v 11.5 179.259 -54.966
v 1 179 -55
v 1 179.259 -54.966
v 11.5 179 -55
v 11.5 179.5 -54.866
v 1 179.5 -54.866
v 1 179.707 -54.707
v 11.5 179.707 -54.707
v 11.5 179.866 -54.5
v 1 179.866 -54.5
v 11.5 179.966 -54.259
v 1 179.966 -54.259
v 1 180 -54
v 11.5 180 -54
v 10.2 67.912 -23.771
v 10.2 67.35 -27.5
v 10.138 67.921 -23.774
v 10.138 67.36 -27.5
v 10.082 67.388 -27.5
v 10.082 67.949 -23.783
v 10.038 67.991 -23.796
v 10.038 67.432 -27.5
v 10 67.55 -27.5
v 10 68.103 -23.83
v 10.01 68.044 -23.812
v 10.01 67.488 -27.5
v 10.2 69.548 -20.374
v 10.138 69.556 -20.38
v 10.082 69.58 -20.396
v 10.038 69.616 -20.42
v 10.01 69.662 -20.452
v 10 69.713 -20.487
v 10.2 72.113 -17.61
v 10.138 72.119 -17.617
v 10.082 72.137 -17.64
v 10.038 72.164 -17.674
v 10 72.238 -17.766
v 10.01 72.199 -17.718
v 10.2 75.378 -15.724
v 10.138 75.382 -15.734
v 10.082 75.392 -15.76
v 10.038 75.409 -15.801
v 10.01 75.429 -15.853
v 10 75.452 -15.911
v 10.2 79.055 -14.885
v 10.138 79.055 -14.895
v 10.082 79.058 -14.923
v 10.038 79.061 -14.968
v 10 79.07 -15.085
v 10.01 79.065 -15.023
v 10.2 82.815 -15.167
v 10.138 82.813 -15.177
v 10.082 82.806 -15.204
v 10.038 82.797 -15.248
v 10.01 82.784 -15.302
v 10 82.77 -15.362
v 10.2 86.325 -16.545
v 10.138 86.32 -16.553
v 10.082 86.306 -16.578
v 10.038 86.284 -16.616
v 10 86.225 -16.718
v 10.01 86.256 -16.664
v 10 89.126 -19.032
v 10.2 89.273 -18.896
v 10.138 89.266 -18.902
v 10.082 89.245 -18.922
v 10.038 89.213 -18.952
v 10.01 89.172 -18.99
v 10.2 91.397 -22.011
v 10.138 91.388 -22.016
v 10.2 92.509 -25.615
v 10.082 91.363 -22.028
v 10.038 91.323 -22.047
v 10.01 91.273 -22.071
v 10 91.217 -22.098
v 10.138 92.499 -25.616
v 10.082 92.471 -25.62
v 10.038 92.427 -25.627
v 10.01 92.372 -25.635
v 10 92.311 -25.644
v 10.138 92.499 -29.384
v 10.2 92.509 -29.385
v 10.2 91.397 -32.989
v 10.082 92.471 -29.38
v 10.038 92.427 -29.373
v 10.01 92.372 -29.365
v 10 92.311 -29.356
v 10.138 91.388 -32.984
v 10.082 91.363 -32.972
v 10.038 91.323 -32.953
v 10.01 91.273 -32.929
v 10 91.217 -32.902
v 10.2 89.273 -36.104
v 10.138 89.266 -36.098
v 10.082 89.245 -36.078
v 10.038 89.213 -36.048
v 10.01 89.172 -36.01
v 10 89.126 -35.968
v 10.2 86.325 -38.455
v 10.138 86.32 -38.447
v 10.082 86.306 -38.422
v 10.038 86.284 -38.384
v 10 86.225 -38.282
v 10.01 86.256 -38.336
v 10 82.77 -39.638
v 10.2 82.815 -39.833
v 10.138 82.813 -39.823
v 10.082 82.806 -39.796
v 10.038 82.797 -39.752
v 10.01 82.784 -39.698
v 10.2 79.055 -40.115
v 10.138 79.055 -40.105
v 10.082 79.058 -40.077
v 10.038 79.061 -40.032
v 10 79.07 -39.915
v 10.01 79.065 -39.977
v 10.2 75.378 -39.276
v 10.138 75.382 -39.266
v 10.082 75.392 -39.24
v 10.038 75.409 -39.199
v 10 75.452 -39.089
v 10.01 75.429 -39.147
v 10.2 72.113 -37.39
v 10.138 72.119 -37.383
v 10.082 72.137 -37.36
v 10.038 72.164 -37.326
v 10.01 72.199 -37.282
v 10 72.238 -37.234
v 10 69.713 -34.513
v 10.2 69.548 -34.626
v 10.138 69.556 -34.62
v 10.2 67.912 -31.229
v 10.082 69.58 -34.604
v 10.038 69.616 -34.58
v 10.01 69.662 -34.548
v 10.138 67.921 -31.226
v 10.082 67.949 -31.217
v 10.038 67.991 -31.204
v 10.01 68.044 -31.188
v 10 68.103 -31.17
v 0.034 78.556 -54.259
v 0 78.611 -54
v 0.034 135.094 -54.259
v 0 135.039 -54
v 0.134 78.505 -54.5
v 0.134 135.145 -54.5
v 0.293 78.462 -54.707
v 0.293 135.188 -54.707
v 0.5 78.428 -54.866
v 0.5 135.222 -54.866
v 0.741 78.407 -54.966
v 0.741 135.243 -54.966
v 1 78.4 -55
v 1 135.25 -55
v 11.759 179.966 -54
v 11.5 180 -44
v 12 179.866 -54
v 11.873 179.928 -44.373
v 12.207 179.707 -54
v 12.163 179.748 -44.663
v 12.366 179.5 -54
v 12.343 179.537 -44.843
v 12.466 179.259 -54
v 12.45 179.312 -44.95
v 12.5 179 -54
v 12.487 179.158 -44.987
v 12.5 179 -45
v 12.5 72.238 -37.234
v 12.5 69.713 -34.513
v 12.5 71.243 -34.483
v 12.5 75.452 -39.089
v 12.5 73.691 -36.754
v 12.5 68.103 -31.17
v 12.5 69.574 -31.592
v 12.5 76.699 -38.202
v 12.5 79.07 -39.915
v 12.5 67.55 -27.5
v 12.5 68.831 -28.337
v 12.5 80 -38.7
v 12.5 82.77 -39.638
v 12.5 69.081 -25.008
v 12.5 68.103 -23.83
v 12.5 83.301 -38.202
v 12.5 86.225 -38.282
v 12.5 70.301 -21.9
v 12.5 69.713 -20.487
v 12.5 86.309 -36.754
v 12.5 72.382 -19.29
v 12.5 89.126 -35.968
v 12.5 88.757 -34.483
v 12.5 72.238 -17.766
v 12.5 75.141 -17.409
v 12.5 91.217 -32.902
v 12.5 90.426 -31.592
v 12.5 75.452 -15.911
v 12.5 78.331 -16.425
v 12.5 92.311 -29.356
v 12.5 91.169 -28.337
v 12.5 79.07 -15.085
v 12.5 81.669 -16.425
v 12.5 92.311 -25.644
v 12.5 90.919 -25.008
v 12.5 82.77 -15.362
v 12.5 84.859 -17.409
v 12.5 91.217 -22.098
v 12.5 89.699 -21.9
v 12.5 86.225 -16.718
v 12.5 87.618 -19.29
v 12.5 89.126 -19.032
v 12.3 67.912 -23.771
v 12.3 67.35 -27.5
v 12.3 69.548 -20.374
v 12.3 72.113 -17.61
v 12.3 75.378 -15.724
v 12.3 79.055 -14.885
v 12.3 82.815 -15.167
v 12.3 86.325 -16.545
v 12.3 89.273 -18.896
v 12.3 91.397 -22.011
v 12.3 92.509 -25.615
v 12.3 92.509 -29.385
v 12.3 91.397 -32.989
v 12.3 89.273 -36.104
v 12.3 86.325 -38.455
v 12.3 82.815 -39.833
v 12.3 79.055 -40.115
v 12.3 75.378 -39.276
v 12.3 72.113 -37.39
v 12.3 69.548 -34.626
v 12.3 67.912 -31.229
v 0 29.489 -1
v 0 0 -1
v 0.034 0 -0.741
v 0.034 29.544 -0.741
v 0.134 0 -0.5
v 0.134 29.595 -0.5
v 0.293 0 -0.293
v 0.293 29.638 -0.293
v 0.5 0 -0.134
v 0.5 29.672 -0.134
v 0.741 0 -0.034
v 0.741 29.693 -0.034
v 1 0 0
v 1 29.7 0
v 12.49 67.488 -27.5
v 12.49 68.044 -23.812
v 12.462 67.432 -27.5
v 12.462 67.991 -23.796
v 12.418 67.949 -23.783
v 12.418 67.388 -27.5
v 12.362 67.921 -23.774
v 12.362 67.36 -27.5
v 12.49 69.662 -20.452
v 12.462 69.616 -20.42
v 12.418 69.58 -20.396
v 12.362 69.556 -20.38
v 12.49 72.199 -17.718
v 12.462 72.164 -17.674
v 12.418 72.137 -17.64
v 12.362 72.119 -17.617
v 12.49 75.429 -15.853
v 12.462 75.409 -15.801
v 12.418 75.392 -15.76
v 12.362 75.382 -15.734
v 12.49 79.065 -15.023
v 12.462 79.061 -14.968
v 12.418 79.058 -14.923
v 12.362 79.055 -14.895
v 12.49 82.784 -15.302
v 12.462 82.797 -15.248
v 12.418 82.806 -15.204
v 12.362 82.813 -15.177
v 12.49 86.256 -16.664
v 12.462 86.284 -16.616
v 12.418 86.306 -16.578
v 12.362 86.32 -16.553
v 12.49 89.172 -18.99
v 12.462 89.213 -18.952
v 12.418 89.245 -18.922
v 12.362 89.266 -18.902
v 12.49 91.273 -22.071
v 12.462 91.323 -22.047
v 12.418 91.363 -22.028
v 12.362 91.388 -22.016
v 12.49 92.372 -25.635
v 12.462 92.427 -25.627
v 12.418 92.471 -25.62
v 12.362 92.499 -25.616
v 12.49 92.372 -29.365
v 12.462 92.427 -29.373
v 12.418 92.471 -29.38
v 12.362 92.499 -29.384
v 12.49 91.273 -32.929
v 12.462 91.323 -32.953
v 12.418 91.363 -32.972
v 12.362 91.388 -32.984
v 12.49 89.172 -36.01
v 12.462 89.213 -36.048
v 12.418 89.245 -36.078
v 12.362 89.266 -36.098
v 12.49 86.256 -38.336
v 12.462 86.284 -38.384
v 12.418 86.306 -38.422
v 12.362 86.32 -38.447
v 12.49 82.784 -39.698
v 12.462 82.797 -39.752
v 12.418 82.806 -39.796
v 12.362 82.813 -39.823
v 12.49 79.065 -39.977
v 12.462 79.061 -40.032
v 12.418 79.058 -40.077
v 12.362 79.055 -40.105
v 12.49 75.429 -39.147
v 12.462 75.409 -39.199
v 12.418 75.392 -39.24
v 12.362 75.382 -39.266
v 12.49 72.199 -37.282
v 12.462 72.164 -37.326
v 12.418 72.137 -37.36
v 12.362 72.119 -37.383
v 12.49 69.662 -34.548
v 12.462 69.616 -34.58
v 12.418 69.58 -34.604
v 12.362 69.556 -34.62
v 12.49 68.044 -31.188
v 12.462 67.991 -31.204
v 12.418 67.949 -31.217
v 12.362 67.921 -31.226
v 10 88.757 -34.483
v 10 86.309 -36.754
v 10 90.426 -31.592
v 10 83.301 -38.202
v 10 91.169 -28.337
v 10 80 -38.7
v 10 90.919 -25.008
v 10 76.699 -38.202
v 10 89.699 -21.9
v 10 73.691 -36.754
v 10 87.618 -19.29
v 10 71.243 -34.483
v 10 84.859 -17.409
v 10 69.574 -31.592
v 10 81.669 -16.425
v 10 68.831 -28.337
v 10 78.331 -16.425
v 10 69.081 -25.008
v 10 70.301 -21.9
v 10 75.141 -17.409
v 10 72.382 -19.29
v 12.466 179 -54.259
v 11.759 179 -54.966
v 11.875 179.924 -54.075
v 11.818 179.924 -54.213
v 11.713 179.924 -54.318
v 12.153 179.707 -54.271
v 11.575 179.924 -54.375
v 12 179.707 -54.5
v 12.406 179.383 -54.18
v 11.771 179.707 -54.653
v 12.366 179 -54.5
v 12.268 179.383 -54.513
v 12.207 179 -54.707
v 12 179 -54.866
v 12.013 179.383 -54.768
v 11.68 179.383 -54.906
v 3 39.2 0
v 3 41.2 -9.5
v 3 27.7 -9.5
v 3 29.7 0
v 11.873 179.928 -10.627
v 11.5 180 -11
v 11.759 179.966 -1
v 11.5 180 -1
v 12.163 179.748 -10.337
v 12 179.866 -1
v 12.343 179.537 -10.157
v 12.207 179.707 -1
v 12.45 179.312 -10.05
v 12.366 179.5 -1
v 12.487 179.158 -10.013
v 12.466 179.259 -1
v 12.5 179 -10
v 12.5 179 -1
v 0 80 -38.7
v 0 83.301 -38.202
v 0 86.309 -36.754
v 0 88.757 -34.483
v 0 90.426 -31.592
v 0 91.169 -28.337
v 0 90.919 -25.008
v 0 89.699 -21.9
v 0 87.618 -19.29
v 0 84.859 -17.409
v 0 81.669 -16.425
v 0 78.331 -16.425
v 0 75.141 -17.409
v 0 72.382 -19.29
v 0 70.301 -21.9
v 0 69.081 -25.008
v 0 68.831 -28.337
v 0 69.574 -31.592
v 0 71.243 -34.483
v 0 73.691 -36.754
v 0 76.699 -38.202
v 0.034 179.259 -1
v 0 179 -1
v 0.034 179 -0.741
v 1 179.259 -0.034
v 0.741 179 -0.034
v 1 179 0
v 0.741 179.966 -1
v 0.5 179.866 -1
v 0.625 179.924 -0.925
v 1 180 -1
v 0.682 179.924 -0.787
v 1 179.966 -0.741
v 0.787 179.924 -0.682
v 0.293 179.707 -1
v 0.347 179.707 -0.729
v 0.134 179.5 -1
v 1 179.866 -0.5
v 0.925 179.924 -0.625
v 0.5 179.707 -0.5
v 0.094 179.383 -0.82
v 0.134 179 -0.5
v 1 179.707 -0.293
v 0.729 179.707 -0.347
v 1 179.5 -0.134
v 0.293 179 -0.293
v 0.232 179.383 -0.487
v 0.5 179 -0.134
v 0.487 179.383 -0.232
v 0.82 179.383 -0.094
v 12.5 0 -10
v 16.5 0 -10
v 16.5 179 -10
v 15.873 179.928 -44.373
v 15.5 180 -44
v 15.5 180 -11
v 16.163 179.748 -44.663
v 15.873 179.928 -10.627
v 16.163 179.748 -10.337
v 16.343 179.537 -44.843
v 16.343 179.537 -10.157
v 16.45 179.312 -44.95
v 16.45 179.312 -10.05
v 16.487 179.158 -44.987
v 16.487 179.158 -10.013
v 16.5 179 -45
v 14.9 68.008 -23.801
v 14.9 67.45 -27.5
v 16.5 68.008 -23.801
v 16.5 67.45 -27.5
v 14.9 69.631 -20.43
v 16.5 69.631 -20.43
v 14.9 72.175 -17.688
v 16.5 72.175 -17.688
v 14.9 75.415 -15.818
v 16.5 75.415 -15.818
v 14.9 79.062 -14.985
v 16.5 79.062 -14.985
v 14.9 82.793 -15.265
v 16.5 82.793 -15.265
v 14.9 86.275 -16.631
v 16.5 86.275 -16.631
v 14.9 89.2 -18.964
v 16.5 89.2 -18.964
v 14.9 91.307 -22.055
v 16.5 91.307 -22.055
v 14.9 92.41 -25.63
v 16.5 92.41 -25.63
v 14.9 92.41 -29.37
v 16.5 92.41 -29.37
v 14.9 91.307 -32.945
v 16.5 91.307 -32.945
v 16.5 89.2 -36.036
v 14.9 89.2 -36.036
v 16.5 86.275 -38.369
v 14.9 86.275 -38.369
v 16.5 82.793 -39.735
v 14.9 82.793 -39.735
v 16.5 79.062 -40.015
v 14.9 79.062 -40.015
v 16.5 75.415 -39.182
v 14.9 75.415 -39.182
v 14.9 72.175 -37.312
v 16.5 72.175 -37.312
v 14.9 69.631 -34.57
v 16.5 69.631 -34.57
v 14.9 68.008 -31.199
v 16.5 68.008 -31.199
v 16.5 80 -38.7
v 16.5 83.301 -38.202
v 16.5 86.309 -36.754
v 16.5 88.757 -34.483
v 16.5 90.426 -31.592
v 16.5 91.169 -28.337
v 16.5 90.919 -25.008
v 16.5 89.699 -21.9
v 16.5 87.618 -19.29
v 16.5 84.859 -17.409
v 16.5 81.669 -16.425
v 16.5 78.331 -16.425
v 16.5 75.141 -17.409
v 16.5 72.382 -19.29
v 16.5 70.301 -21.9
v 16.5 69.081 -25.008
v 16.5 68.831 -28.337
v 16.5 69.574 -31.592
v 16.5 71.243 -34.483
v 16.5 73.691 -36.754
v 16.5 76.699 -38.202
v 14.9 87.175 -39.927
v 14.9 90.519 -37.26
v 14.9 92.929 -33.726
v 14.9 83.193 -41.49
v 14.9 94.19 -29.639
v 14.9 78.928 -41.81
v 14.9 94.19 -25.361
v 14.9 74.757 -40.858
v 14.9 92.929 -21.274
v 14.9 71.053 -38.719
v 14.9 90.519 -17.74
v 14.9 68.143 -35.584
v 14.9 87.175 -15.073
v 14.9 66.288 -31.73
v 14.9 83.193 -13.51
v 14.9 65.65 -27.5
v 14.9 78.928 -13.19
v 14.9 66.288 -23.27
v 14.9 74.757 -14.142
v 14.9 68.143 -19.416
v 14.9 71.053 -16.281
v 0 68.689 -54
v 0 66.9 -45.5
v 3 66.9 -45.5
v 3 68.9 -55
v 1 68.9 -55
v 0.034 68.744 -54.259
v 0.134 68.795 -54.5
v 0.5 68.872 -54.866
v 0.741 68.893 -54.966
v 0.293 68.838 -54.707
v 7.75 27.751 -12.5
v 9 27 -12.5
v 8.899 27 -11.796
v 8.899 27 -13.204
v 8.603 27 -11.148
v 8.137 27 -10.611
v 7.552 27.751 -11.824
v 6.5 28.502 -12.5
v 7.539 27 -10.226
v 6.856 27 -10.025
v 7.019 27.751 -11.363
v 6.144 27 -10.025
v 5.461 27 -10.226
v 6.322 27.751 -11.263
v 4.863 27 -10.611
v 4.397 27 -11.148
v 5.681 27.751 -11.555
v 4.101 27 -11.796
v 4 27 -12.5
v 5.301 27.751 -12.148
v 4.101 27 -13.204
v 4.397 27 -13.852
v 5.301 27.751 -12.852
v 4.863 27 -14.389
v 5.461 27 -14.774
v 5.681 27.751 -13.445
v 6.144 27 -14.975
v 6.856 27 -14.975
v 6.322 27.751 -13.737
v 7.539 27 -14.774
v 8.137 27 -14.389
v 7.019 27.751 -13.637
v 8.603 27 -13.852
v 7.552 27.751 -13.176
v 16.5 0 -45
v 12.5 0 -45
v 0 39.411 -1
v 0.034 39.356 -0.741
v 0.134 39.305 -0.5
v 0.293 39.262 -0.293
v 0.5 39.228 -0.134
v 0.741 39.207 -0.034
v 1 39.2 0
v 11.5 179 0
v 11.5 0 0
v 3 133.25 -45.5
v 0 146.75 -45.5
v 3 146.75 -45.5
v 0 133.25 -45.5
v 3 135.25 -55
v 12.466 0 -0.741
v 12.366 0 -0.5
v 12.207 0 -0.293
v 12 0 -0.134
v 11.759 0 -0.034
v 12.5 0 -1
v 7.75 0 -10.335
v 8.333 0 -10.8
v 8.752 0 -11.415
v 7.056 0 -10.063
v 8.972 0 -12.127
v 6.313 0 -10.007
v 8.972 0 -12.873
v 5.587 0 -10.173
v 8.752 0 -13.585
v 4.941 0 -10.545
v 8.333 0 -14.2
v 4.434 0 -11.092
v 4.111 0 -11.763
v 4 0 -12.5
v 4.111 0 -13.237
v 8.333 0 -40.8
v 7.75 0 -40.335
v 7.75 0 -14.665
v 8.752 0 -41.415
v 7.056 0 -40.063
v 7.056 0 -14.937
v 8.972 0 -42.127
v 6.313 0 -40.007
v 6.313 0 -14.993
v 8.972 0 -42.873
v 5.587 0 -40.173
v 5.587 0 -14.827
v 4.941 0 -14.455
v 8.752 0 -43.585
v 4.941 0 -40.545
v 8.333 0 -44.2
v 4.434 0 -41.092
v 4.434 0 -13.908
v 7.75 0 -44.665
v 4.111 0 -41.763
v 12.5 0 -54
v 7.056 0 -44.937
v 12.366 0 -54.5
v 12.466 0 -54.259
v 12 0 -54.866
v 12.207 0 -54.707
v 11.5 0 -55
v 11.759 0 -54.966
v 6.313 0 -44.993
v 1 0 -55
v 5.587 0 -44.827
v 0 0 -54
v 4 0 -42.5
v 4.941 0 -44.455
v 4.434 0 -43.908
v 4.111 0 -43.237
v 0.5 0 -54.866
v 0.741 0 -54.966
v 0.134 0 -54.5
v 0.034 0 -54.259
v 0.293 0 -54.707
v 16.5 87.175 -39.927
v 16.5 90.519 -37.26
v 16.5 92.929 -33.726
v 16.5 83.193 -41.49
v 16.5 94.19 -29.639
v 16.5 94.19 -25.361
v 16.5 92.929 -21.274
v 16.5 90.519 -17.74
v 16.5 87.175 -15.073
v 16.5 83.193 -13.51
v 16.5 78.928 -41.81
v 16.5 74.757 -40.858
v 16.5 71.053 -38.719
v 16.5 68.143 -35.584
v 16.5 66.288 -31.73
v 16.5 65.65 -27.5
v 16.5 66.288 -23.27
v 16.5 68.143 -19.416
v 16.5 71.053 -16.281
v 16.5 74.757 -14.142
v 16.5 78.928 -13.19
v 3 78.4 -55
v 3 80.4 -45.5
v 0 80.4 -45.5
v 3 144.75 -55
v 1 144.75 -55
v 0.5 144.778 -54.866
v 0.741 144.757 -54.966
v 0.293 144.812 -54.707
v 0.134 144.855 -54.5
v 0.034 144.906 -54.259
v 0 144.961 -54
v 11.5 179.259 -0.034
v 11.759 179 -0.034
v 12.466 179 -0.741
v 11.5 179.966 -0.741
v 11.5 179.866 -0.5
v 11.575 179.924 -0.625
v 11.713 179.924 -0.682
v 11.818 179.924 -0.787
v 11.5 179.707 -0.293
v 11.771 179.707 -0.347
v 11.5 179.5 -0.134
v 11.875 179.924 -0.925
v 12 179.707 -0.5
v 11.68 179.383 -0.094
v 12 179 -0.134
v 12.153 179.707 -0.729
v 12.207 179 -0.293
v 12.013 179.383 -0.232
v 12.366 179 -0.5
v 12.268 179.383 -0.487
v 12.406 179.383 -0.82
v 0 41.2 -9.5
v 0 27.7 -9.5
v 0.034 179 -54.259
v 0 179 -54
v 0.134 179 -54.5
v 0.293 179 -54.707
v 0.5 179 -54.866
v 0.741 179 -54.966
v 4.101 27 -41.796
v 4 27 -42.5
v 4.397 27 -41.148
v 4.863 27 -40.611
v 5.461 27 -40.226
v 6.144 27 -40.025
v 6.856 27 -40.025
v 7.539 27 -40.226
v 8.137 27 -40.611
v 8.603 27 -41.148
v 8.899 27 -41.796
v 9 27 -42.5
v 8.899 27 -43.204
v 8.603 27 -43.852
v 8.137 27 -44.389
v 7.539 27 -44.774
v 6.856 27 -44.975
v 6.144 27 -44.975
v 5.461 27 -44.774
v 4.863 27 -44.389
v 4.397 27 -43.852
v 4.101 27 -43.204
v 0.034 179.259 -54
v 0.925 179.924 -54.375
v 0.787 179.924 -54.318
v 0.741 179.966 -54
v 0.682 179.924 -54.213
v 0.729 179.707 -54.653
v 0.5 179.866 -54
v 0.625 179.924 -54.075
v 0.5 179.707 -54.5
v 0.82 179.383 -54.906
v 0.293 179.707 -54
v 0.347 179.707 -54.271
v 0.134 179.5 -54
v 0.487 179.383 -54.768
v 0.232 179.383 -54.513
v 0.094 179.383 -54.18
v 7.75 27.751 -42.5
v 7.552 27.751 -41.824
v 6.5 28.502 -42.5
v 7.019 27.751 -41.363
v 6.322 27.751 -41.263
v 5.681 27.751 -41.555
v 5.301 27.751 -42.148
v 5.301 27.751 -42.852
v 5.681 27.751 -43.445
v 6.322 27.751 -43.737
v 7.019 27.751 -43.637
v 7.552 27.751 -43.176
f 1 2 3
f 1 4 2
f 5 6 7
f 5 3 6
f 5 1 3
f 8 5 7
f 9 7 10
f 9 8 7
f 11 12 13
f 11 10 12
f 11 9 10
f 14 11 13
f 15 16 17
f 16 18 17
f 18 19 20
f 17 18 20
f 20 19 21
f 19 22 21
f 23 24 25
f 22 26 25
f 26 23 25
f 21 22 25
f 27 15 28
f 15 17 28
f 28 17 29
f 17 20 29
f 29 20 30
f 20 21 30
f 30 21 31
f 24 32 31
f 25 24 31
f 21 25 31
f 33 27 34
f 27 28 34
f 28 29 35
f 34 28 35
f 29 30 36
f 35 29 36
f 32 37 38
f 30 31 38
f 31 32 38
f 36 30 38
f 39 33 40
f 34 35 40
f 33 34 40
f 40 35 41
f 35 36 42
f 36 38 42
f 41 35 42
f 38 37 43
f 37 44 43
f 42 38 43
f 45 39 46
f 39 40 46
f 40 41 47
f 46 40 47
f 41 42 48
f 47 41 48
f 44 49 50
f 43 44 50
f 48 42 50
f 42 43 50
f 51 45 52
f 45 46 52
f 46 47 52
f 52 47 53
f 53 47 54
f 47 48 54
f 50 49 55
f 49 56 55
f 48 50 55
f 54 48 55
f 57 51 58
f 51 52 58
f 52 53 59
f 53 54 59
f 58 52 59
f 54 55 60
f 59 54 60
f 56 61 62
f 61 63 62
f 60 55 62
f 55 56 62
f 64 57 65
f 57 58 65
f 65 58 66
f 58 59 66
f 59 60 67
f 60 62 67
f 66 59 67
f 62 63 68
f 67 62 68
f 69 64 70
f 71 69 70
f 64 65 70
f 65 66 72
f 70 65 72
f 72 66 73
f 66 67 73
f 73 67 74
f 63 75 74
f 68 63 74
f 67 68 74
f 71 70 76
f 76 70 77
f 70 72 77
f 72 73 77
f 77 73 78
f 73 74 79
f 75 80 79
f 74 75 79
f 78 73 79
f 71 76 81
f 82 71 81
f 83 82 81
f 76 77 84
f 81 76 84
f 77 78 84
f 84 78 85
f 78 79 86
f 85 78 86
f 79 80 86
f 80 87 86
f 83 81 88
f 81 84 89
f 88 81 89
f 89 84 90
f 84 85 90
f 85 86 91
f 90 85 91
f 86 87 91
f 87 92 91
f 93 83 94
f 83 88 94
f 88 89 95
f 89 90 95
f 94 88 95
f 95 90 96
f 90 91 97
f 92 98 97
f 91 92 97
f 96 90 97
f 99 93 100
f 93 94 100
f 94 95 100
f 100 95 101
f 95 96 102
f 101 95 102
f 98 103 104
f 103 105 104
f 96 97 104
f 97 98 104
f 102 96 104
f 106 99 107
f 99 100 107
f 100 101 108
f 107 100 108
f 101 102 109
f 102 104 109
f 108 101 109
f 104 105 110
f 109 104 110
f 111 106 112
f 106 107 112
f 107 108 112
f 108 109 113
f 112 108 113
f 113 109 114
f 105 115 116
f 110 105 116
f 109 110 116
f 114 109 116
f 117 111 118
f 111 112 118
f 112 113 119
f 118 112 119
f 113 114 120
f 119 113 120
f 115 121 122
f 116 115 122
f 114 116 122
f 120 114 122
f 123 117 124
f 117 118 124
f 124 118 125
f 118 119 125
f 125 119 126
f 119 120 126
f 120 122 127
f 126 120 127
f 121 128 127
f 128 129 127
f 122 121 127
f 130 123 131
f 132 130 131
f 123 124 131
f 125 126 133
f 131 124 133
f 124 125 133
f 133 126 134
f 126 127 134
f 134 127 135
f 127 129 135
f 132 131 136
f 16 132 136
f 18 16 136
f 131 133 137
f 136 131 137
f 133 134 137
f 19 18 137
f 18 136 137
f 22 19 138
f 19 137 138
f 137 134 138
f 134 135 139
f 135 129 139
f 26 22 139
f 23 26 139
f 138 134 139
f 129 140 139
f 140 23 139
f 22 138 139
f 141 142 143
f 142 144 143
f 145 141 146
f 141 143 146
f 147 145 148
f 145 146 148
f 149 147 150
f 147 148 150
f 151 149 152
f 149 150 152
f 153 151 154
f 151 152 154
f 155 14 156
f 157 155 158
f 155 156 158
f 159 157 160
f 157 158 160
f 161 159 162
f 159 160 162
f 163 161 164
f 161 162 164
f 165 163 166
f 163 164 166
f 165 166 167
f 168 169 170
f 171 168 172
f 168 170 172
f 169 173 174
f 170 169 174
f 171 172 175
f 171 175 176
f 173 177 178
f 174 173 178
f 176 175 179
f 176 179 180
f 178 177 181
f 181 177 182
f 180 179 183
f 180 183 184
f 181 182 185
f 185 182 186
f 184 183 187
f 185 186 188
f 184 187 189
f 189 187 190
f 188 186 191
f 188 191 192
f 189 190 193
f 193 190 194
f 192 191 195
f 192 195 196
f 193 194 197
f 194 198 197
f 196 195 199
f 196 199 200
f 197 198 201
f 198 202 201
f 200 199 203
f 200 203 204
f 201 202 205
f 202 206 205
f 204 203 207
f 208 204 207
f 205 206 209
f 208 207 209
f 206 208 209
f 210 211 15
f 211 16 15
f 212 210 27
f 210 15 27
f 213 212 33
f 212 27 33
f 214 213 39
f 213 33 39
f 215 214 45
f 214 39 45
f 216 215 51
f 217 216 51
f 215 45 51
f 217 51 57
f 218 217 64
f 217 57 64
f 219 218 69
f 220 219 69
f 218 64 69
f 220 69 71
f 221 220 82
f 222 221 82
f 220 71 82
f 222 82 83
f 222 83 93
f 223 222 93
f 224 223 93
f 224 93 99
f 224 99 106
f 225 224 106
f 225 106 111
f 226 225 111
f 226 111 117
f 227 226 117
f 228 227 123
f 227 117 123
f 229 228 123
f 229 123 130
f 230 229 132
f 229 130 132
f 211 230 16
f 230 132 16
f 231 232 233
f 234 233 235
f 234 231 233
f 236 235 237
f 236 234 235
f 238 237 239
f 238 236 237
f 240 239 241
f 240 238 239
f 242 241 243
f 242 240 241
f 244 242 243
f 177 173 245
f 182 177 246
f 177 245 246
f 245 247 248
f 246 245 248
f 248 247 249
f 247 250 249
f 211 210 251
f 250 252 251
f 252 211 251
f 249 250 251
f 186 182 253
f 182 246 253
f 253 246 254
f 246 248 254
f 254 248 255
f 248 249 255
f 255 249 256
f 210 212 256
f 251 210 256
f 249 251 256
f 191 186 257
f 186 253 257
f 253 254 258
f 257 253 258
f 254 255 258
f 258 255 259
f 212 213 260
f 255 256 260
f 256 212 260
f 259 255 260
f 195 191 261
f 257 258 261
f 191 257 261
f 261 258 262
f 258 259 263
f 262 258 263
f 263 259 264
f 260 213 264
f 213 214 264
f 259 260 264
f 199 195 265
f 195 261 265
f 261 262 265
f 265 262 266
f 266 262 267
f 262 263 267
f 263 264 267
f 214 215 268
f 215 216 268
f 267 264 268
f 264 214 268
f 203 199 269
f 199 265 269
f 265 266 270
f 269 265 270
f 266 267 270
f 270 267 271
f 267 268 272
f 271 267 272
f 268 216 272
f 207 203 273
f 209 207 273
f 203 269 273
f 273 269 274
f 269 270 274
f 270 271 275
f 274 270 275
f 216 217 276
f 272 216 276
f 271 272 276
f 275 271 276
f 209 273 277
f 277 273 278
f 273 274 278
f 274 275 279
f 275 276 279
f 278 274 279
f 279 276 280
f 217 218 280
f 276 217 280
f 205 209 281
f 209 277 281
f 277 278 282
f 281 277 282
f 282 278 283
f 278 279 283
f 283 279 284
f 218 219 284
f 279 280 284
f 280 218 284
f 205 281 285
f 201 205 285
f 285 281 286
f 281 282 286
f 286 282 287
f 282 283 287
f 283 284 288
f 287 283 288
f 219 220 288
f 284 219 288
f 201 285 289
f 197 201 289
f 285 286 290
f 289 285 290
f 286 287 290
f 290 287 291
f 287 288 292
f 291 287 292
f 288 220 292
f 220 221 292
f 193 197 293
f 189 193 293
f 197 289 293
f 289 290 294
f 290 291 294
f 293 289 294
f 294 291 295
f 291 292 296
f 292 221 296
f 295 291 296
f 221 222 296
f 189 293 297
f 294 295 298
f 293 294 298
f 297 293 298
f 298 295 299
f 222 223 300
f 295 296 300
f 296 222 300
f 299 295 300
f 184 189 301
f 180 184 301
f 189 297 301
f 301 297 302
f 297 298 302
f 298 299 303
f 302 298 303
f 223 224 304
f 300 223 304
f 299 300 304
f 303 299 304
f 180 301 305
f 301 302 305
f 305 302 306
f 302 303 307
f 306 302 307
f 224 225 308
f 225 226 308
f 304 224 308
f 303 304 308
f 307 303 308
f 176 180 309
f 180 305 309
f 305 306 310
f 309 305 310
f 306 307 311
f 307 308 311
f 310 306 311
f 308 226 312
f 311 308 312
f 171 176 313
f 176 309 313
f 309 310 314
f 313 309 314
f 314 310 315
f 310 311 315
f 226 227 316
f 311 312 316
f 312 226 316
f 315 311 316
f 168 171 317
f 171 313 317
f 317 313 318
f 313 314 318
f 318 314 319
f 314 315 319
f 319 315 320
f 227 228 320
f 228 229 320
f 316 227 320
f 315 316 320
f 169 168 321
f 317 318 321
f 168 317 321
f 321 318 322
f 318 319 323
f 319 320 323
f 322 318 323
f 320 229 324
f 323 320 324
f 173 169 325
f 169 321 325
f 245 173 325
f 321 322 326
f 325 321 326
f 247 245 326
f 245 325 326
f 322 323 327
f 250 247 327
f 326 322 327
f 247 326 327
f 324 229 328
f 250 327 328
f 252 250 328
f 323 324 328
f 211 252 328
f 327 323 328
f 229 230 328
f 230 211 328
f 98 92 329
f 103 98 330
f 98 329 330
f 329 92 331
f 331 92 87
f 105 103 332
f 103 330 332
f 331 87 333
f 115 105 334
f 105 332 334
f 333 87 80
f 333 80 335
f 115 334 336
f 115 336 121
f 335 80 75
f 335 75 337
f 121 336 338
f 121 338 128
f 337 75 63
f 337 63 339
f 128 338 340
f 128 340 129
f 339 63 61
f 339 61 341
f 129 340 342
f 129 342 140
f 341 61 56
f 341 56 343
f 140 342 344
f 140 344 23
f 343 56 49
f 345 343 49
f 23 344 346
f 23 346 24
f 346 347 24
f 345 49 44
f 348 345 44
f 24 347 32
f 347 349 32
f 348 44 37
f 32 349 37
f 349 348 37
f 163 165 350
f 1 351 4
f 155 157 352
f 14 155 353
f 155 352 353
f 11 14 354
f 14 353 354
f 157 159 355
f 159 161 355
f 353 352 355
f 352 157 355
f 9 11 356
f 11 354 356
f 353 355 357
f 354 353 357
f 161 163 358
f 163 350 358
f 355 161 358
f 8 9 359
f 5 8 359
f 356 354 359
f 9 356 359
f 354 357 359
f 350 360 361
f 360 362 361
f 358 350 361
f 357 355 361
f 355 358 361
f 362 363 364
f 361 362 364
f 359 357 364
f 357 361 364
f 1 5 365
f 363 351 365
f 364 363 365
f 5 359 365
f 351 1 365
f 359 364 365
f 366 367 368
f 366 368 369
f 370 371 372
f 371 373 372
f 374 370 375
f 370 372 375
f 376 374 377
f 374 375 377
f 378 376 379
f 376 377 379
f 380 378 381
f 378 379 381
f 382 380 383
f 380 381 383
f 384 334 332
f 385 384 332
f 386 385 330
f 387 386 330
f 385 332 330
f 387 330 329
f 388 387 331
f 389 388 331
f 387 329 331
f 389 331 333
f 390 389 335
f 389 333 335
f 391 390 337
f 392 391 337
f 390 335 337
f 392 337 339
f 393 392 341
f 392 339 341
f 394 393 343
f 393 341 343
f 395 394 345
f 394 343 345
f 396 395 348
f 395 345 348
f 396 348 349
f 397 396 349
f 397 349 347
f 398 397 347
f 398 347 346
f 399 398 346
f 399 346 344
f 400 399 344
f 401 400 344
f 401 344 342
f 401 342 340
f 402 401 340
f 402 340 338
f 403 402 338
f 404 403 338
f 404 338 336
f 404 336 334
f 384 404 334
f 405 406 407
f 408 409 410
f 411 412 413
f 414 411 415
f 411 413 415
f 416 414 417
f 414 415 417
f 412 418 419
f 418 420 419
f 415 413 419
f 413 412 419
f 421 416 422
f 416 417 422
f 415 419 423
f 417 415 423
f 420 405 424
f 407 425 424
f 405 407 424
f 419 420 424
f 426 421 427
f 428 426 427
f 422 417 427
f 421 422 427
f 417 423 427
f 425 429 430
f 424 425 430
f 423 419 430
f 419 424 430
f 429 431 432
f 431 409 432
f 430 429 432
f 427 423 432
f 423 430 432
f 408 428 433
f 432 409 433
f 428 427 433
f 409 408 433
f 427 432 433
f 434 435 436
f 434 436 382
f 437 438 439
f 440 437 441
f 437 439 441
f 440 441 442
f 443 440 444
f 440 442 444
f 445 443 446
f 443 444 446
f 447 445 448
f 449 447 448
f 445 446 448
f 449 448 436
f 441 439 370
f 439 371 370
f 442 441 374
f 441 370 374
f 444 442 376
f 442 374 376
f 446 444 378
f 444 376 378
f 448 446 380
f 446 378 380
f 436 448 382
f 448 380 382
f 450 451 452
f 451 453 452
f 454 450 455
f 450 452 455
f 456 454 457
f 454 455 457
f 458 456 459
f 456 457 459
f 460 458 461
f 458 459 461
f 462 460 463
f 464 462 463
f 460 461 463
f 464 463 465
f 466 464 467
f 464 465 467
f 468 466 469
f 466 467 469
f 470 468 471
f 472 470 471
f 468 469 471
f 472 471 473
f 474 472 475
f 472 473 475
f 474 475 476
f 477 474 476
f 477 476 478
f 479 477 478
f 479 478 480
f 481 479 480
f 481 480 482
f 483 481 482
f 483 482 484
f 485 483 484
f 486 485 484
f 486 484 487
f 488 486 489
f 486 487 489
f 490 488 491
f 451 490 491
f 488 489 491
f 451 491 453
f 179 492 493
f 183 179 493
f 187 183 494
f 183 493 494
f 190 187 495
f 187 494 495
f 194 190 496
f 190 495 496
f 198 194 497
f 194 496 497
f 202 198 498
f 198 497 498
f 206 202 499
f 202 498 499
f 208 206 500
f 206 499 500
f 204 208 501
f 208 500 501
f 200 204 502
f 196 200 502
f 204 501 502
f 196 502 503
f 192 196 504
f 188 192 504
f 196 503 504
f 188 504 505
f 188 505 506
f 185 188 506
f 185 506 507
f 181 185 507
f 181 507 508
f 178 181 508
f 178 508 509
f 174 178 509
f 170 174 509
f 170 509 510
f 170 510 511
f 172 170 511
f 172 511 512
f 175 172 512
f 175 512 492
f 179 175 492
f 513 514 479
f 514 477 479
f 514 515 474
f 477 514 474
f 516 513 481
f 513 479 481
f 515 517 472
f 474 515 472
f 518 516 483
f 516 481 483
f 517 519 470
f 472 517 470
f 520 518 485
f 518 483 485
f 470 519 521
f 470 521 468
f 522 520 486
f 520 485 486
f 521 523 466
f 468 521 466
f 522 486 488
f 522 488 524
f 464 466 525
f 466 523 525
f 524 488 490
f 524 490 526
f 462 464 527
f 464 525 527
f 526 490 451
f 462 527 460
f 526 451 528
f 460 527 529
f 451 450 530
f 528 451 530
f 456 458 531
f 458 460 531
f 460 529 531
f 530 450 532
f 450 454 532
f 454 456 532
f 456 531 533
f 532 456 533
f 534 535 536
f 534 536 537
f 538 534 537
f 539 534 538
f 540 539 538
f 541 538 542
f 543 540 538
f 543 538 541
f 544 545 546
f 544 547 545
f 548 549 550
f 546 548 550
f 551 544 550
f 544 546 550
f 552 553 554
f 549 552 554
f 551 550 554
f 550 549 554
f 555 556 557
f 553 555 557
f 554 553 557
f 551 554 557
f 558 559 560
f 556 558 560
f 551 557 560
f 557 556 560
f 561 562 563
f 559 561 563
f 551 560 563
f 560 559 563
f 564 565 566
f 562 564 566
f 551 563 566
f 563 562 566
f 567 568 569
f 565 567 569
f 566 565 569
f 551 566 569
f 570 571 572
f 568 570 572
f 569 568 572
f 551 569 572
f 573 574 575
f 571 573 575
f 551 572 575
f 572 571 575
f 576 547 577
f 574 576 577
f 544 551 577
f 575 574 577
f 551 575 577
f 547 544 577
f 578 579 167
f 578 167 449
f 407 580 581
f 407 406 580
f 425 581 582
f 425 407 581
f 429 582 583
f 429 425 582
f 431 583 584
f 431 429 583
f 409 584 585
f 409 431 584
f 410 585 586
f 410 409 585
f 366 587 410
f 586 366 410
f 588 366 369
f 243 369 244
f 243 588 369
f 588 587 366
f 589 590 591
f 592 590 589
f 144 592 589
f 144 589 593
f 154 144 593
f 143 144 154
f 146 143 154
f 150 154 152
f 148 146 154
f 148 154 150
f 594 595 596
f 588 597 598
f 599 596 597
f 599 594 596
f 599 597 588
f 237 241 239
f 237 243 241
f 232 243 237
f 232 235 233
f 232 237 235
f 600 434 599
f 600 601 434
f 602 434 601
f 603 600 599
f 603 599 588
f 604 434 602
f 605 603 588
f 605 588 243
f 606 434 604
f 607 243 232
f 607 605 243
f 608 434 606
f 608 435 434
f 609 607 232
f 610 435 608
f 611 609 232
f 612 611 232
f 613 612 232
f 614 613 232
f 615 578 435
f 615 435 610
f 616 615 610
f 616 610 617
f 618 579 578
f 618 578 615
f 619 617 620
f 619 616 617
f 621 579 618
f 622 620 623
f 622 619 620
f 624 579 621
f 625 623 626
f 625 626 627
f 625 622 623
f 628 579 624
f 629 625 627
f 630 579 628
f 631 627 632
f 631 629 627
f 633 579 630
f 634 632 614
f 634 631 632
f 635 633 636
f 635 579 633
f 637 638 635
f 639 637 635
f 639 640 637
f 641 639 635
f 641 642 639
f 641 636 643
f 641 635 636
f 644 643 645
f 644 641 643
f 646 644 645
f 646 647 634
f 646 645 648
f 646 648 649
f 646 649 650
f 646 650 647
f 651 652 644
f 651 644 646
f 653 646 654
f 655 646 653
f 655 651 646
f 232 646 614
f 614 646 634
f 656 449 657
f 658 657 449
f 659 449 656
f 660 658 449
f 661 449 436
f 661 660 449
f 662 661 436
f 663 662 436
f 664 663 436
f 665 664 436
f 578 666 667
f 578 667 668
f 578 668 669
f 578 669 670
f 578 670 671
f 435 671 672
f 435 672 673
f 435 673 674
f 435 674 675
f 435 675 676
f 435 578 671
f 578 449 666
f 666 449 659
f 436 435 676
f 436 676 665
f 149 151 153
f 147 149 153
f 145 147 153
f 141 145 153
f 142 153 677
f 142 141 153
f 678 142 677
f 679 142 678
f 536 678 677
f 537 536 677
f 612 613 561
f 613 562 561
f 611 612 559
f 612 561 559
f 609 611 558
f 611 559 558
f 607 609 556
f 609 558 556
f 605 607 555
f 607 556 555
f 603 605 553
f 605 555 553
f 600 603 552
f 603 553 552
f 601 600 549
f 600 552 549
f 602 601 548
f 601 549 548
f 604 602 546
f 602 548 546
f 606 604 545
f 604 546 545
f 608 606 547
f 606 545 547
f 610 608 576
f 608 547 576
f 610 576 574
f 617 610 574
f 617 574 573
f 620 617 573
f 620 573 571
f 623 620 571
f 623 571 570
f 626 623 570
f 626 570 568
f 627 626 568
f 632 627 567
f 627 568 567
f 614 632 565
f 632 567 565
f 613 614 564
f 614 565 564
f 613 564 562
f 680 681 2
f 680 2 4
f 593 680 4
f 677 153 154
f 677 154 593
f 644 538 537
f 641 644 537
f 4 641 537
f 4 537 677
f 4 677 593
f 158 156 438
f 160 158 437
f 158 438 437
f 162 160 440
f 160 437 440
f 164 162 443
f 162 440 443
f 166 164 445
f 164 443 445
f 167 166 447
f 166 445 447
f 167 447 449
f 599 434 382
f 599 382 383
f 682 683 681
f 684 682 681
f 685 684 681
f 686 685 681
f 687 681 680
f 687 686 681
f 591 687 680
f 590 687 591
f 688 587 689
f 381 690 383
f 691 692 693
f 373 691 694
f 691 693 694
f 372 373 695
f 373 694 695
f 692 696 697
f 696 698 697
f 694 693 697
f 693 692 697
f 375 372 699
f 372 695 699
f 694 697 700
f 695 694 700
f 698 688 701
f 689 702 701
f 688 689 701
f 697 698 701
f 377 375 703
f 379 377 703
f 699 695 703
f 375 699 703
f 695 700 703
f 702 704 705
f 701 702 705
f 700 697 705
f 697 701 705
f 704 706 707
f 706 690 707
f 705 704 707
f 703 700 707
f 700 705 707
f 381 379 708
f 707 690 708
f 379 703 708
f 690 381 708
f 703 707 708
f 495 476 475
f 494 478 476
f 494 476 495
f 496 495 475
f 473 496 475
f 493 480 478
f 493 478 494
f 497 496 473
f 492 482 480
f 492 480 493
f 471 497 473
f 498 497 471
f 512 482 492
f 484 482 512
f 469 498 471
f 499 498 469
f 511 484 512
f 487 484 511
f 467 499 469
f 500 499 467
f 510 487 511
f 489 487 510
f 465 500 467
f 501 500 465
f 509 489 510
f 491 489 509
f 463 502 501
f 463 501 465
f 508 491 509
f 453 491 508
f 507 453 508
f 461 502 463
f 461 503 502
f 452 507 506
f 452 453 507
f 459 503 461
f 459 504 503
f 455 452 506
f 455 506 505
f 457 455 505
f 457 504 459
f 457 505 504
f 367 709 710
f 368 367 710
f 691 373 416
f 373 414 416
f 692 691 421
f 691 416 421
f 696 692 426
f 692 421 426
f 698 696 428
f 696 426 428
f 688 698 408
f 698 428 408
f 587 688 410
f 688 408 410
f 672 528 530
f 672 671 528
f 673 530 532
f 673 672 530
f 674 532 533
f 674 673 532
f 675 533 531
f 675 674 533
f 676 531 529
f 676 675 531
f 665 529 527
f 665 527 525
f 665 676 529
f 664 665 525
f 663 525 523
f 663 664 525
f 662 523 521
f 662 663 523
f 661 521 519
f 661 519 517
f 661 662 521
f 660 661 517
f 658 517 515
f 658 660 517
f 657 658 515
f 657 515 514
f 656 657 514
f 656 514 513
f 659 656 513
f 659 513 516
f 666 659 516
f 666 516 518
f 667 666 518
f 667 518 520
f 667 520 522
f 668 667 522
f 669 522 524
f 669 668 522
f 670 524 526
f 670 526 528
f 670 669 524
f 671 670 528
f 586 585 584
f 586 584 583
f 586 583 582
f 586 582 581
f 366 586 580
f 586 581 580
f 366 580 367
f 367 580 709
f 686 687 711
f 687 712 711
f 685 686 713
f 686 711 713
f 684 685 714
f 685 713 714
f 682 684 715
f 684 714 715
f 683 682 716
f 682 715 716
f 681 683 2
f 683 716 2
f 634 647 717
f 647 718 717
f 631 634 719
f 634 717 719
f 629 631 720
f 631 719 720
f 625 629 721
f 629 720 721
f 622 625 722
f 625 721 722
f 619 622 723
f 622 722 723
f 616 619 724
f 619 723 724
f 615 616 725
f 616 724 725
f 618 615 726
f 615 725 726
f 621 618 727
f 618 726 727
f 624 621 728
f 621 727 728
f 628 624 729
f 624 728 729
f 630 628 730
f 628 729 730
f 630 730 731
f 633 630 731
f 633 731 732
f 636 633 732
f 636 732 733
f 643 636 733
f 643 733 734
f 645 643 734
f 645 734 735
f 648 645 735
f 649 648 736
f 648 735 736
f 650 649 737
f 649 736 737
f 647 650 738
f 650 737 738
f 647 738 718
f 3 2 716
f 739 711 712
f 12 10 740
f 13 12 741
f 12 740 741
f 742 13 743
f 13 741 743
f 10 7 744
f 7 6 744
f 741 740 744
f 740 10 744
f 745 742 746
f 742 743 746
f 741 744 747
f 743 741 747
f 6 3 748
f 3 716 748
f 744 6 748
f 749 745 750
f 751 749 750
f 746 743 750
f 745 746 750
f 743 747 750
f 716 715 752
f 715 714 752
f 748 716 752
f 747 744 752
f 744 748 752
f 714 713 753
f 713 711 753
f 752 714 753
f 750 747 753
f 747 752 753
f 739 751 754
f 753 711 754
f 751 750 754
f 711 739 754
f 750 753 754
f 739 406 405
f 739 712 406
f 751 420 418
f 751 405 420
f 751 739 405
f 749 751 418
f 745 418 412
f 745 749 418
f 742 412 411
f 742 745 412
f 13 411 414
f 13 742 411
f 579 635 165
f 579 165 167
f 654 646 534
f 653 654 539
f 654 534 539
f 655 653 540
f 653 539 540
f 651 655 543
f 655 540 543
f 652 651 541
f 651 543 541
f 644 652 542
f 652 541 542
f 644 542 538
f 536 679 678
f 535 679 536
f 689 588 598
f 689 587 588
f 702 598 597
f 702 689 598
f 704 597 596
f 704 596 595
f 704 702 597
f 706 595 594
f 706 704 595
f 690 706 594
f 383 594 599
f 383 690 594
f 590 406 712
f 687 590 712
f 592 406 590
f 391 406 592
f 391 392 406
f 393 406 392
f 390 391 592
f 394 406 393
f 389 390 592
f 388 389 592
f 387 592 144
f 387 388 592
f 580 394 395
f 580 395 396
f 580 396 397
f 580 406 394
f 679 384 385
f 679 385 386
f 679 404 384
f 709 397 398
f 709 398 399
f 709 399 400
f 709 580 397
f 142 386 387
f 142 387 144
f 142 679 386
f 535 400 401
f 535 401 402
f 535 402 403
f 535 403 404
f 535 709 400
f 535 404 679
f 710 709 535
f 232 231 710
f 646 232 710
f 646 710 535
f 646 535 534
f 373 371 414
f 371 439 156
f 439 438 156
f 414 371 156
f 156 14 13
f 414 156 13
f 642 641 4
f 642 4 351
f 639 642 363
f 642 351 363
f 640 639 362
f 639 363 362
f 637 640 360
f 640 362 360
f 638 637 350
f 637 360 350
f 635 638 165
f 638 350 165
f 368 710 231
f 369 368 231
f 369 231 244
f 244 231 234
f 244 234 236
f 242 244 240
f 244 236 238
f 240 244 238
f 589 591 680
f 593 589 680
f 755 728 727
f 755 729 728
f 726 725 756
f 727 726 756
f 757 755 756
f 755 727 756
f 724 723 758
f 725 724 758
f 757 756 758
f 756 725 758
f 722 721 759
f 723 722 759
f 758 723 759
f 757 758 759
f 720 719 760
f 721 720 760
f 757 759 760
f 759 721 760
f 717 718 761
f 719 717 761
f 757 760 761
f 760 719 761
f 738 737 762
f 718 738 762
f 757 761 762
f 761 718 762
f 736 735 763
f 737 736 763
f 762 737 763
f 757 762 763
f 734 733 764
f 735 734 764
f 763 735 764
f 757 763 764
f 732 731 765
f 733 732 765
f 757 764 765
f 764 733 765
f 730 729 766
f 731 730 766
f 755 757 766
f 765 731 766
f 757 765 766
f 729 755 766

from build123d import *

# Parameters (mm, degrees)
BOSS_EXTRUDE1_DEPTH   = 180
SKETCH3_R             = 11.2
CUT_EXTRUDE1_DEPTH    = 17.5
SKETCH11_W            = 1.6
SKETCH11_H            = 1.8
LPATTERN1_COUNT       = 2
LPATTERN1_PITCH       = 60
M6_TAPPED_HOLE1_D     = 5
M6_TAPPED_HOLE1_DEPTH = 27
M6_TAPPED_HOLE1_TIP   = 1.502151548
CUT_EXTRUDE2_DEPTH    = 3
FILLET1_R             = 1
SKETCH16_R            = 16.086182712
BOSS_EXTRUDE2_DEPTH   = 16.5


with BuildPart() as part:
    # Sketch1 → Boss-Extrude1 (new body)
    with BuildSketch(Plane(origin=(0, 0, 0), x_dir=(1, 0, 0), z_dir=(0, 1, 0))):
        Polygon((0, 0), (0, 55), (12.5, 55), (12.5, 45), (16.5, 45), (16.5, 10), (12.5, 10), (12.5, 0), align=None)
    extrude(amount=BOSS_EXTRUDE1_DEPTH)

    # Sketch3 → Cut-Extrude1 (cut, through all)
    with BuildSketch(Plane(origin=(16.5, 0, 0), x_dir=(0, 0, -1), z_dir=(1, 0, 0))):
        with Locations((27.5, 80)):
            Circle(SKETCH3_R)
    cut_extrude1 = extrude(amount=-CUT_EXTRUDE1_DEPTH, mode=Mode.SUBTRACT)

    # Sketch11 → Cut-Revolve1 (revolve, cut)
    with BuildSketch(Plane.XY.offset(-27.5)):
        with BuildLine():
            Line((10, 69.15), (12.5, 69.15))
            Line((12.5, 69.15), (12.5, 67.55))
            ThreePointArc((12.5, 67.55), (12.441421356, 67.408578644), (12.3, 67.35))
            Line((12.3, 67.35), (10.2, 67.35))
            ThreePointArc((10.2, 67.35), (10.058578644, 67.408578644), (10, 67.55))
            Line((10, 67.55), (10, 69.15))
        make_face()
        with Locations((15.7, 66.55)):
            Rectangle(SKETCH11_W, SKETCH11_H)
    cut_revolve1 = revolve(axis=Axis((16.5, 80, -27.5), (-1, 0, 0)), mode=Mode.SUBTRACT)

    # LPattern1: Cut-Extrude1, Cut-Revolve1 ×2
    with Locations(*[(0, i * LPATTERN1_PITCH, 0) for i in range(1, LPATTERN1_COUNT)]):
        add(cut_extrude1, mode=Mode.SUBTRACT)
        add(cut_revolve1, mode=Mode.SUBTRACT)

    # M6 Tapped Hole1
    with Locations(Plane.XZ):
        with Locations((6.5, -12.5), (6.5, -42.5)):
            Hole(M6_TAPPED_HOLE1_D / 2, depth=M6_TAPPED_HOLE1_DEPTH)
            with Locations((0, 0, -(M6_TAPPED_HOLE1_DEPTH + M6_TAPPED_HOLE1_TIP / 2))):  # 118° drill point
                Cone(0, M6_TAPPED_HOLE1_D / 2, M6_TAPPED_HOLE1_TIP, mode=Mode.SUBTRACT)

    # Sketch15 → Cut-Extrude2 (cut)
    with BuildSketch(Plane.ZY):
        Polygon((-55, 144.75), (-45.5, 146.75), (-45.5, 133.25), (-55, 135.25), align=None)
        Polygon((-55, 78.4), (-45.5, 80.4), (-45.5, 66.9), (-55, 68.9), align=None)
        Polygon((0, 39.2), (-9.5, 41.2), (-9.5, 27.7), (0, 29.7), align=None)
    extrude(amount=-CUT_EXTRUDE2_DEPTH, mode=Mode.SUBTRACT)

    # Fillet1
    fillet1_edges = [part.edges().sort_by_distance(p)[0] for p in [
        (14.5, 180, -10),
        (16.5, 180, -27.5),
        (0, 109.6, 0),
        (0, 162.375, -55),
        (12.5, 90, -55),
        (12.5, 90, 0),
        (14.5, 180, -45),
        (12.5, 180, -50),
        (6.25, 180, -55),
        (0, 180, -27.5),
        (6.25, 180, 0),
        (12.5, 180, -5),
        (0, 106.825, -55),
        (0, 34.45, -55),
        (0, 14.85, 0),
    ]]
    fillet(fillet1_edges, radius=FILLET1_R)

    # Sketch16 → Boss-Extrude2 (add)
    with BuildSketch(Plane(origin=(16.5, 0, 0), x_dir=(0, 0, -1), z_dir=(1, 0, 0))):
        with Locations((27.5, 140)):
            Circle(SKETCH16_R)
    extrude(amount=-BOSS_EXTRUDE2_DEPTH)


solid = part.part
